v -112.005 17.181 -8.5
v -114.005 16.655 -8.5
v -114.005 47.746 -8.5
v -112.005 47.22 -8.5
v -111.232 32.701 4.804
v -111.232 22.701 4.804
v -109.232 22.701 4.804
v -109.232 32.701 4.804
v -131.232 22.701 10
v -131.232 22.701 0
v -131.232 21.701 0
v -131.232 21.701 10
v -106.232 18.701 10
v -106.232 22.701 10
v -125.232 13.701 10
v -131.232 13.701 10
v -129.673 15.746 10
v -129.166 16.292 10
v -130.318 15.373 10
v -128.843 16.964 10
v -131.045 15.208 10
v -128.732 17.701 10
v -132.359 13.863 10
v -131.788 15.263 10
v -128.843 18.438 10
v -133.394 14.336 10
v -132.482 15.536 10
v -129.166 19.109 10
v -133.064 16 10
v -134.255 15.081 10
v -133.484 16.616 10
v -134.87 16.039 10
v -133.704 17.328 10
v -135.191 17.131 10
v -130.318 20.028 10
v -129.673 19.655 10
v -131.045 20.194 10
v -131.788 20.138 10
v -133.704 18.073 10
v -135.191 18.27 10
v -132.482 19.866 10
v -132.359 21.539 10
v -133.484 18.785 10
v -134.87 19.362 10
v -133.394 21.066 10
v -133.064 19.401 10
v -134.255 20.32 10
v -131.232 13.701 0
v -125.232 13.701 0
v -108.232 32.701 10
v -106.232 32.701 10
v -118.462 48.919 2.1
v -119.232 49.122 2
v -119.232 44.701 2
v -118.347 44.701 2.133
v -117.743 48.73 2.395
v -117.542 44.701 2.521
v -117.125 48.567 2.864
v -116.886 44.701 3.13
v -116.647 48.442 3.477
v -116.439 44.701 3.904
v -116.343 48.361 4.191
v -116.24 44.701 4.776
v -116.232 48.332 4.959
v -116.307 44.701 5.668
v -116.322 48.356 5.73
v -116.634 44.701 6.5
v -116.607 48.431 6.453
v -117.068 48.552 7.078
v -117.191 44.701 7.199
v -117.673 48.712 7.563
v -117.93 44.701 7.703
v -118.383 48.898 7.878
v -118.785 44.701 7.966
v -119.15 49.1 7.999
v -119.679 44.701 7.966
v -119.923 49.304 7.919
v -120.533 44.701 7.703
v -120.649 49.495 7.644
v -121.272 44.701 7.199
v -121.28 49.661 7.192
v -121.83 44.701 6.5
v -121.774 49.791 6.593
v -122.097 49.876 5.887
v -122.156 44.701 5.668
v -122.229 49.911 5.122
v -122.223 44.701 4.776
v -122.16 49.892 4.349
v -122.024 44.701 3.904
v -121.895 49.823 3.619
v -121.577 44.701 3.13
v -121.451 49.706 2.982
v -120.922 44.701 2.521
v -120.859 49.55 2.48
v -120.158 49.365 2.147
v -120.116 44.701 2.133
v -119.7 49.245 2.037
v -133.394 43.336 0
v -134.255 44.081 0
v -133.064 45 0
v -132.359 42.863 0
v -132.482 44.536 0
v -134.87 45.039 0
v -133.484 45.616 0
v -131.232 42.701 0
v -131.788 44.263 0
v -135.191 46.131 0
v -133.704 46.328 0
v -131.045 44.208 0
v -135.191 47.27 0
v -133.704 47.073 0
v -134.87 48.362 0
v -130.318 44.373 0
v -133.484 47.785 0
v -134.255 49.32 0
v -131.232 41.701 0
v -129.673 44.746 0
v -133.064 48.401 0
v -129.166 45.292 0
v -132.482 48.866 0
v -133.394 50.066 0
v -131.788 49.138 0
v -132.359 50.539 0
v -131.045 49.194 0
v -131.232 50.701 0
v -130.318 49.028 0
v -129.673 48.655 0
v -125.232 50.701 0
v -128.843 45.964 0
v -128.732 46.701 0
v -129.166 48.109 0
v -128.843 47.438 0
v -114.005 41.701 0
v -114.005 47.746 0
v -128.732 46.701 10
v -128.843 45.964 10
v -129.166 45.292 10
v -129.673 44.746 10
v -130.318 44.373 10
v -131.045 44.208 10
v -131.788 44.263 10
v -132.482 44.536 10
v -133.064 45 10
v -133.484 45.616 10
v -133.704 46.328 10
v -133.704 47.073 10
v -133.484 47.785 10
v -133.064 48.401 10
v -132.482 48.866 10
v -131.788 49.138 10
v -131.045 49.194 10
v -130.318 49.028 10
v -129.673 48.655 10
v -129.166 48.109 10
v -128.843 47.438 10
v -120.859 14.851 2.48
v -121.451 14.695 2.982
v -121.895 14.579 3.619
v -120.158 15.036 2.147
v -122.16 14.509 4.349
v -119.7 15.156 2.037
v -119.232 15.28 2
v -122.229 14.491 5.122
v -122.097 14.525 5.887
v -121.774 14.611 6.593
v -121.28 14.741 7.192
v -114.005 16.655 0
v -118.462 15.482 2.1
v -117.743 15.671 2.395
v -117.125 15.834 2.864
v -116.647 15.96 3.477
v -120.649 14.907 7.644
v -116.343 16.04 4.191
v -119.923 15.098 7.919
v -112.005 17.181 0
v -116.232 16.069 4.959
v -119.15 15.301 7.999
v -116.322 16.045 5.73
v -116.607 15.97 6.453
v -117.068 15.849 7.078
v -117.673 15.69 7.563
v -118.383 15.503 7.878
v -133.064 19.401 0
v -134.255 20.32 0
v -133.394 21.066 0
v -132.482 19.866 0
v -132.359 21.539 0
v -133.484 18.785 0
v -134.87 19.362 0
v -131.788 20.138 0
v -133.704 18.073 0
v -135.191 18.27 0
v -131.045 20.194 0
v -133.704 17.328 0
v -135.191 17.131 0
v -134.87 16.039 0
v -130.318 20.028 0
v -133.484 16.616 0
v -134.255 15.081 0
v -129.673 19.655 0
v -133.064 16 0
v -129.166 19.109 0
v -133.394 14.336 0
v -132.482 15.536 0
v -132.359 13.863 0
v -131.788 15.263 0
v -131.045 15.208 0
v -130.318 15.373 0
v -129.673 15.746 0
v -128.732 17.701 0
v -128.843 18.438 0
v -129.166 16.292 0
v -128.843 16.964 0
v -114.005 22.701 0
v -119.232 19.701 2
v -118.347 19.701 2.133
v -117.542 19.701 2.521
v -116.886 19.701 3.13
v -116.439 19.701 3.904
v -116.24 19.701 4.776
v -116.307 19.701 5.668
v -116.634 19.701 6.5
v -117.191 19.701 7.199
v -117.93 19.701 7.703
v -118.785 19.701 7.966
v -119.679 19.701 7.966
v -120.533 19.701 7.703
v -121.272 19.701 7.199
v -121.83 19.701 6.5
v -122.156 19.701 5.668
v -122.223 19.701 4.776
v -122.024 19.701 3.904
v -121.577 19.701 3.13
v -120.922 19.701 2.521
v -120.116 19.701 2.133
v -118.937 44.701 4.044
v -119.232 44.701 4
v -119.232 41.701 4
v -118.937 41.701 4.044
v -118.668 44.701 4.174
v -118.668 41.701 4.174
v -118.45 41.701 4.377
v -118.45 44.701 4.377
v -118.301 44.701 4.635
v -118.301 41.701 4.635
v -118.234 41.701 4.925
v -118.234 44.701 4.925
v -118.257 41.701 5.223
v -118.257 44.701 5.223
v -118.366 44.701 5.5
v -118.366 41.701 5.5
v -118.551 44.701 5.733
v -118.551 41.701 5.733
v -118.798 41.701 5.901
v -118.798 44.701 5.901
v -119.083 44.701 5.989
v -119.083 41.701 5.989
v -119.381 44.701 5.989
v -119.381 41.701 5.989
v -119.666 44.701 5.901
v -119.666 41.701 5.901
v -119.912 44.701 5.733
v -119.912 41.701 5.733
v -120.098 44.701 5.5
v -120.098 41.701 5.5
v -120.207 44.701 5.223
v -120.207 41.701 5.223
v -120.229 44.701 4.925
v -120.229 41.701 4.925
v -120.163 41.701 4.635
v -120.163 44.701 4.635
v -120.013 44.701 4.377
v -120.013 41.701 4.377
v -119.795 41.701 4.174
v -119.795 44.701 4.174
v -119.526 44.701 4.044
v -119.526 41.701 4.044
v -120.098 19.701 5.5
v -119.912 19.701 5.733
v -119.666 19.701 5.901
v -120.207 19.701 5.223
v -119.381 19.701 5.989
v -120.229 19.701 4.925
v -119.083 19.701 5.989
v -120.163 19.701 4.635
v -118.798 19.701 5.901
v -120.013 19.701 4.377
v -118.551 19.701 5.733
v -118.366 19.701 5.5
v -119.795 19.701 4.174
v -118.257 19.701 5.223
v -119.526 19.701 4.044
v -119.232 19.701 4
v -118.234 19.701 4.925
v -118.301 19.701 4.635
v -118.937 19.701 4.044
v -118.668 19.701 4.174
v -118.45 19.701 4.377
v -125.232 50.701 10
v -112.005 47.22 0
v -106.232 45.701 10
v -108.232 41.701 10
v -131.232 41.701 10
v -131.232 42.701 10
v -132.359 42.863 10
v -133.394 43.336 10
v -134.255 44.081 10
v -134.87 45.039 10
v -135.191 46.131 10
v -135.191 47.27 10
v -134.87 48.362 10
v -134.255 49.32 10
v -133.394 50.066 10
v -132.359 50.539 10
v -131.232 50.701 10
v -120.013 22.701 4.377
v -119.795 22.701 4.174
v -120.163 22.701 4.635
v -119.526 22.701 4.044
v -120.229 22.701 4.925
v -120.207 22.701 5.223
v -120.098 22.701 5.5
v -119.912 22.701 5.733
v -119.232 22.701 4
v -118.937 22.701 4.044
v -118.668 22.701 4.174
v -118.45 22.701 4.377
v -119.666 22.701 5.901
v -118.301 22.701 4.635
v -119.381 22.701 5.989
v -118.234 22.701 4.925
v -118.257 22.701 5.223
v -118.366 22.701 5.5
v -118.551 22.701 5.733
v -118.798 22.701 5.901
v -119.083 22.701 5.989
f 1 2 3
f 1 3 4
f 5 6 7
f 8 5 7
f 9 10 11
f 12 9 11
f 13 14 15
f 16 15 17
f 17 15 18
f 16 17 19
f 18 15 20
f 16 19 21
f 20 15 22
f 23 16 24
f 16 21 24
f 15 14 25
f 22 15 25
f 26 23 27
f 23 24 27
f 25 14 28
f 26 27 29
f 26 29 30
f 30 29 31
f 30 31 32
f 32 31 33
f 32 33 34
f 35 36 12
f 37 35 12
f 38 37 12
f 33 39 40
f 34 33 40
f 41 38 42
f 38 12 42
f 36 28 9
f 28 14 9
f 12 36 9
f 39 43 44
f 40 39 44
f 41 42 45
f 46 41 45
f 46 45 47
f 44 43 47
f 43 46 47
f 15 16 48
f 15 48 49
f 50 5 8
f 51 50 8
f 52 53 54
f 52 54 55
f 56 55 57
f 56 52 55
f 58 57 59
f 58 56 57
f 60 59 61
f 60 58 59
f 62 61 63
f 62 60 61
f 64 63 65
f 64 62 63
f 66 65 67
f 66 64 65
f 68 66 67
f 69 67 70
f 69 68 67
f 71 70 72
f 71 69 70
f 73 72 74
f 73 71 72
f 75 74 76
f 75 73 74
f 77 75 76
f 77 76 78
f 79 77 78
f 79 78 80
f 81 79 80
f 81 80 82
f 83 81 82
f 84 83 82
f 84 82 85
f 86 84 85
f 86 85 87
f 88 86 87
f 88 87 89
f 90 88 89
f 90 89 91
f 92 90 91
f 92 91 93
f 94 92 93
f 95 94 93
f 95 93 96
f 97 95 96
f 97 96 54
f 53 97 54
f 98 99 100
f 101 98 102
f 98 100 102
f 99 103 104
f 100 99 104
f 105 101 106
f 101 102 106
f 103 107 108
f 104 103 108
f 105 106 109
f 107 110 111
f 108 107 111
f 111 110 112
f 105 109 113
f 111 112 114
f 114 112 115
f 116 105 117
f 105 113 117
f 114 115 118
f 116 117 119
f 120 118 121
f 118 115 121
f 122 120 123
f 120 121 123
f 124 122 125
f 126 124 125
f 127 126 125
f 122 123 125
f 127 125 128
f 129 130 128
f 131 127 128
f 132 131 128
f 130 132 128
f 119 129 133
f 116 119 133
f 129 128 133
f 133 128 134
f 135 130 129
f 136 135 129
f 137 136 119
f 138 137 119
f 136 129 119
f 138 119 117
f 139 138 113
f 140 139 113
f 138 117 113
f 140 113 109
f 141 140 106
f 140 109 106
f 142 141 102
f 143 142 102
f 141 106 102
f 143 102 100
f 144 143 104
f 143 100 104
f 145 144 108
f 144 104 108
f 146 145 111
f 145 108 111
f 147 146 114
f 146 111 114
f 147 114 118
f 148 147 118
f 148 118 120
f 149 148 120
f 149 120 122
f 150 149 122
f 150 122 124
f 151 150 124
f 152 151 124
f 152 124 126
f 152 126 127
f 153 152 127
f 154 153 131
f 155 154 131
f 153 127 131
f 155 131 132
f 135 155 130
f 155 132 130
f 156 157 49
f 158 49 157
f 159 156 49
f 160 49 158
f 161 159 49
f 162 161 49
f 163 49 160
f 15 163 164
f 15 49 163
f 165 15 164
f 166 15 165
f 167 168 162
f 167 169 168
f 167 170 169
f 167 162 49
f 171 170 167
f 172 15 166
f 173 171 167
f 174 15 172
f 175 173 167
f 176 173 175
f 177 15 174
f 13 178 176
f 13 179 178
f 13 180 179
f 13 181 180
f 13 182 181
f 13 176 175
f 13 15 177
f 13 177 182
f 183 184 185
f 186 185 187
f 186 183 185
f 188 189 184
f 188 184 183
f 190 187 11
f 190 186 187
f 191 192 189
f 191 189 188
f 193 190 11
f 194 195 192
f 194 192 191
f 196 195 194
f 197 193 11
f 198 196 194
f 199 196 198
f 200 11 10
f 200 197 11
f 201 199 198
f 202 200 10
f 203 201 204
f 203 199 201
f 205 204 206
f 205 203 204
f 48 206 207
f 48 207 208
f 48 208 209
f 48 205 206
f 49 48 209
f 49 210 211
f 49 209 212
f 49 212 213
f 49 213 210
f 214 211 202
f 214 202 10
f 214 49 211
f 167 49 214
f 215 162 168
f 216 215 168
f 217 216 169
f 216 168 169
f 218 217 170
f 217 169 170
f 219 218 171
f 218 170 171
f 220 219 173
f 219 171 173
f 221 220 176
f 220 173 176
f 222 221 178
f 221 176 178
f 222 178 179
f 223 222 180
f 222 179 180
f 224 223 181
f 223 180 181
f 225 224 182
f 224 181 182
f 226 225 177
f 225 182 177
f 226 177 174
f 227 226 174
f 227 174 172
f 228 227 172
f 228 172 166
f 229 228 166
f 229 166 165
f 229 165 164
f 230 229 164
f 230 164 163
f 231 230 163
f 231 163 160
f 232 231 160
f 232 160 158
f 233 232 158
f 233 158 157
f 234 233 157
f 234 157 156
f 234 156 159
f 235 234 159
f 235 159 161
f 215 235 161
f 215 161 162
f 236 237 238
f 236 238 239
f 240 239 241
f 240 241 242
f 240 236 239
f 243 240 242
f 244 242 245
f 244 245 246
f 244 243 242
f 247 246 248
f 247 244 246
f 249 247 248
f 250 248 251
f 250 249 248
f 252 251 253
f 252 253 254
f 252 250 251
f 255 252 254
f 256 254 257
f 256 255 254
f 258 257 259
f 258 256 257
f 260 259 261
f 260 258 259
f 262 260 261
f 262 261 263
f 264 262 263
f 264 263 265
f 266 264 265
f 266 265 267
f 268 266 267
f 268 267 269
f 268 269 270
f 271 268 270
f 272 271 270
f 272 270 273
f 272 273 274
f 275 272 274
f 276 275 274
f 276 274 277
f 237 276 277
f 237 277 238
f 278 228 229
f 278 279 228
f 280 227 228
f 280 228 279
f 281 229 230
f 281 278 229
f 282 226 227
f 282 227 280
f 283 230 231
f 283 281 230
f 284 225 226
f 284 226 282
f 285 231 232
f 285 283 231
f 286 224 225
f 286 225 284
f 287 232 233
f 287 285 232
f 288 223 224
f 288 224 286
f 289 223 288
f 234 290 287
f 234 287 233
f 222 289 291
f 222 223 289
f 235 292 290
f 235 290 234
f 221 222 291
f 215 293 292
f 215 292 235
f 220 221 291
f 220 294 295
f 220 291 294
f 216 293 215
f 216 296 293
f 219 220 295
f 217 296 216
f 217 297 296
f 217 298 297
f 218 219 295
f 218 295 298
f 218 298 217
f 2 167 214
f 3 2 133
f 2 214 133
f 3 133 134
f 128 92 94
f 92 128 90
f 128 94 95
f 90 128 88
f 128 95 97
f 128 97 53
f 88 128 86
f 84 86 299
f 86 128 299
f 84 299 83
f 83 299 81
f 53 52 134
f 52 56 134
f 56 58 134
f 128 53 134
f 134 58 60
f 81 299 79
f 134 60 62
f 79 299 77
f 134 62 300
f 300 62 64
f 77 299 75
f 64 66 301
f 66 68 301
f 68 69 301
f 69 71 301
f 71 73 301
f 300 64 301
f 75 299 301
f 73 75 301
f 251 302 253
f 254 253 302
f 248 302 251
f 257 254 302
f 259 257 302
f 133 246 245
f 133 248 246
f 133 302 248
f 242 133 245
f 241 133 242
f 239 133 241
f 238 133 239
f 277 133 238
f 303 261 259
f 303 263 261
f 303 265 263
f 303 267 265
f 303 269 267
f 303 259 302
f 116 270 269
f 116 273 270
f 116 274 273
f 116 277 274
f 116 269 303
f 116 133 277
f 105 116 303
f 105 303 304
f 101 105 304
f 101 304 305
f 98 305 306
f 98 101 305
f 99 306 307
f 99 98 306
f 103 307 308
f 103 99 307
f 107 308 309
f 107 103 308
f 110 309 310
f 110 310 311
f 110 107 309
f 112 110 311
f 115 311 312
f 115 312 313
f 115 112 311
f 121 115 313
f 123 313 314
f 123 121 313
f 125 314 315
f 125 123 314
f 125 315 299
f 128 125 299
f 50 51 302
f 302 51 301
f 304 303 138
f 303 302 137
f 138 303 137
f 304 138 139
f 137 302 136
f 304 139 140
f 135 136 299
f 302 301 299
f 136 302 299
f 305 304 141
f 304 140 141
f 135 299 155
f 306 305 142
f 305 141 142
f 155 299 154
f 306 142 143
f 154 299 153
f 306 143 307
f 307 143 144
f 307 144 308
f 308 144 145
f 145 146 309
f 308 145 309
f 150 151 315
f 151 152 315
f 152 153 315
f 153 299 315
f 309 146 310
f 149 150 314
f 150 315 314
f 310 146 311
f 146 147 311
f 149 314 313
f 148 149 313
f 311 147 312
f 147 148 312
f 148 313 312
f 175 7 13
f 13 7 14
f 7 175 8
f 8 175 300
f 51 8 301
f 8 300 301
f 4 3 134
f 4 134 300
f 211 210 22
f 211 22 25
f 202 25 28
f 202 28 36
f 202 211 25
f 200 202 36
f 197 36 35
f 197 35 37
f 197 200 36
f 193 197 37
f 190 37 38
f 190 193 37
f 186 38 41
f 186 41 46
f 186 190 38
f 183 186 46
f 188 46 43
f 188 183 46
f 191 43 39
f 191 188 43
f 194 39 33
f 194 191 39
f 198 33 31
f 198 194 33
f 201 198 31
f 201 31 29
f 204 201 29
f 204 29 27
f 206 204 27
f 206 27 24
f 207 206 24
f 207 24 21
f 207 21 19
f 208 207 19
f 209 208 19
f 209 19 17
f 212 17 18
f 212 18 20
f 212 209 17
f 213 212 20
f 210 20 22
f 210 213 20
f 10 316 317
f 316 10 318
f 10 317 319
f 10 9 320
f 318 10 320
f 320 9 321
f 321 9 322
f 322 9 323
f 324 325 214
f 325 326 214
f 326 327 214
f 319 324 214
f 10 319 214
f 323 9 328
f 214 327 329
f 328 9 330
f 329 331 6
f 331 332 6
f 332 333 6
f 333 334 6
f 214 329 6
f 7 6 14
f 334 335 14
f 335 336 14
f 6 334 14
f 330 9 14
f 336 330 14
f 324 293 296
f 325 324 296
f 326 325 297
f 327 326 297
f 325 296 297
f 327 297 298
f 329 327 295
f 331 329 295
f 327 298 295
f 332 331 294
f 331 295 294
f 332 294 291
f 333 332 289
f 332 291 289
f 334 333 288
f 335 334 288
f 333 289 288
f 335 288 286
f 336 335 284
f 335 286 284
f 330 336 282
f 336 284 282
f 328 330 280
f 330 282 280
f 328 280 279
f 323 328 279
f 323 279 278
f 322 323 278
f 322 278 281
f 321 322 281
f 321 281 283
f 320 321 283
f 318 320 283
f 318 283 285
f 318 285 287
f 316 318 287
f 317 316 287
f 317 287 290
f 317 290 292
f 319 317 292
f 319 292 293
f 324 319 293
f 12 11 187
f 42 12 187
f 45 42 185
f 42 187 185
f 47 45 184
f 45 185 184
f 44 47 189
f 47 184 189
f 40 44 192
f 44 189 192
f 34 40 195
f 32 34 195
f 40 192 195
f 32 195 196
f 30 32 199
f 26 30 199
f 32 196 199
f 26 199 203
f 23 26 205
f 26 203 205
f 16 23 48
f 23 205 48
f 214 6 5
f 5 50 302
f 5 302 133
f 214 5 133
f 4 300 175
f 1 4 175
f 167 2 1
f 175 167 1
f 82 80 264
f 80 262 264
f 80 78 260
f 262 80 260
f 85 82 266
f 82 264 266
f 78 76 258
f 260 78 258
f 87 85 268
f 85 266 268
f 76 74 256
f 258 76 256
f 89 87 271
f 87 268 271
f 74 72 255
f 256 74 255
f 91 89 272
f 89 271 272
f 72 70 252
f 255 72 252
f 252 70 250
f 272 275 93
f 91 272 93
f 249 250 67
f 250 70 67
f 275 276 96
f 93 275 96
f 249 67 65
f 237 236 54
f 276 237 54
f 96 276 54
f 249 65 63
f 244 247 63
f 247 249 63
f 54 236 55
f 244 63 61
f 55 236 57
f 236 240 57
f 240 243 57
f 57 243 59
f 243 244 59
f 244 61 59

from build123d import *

# Parameters (mm, degrees)
CROQUIS1_R              = 2.5
SALIENTE_EXTRUIR1_DEPTH = 10
CROQUIS2_R              = 1
CORTAR_EXTRUIR1_DEPTH   = 4
SALIENTE_EXTRUIR2_DEPTH = 13.5
CROQUIS4_R              = 3
CORTAR_EXTRUIR2_DEPTH   = 1
SALIENTE_EXTRUIR3_START = 5
CROQUIS6_R              = 3
SALIENTE_EXTRUIR3_DEPTH = 5
CORTAR_EXTRUIR3_DEPTH   = 10
SALIENTE_EXTRUIR4_DEPTH = 8.5
CROQUIS5_W              = 2
CROQUIS5_H              = 10
CORTAR_EXTRUIR4_DEPTH   = 6


with BuildPart() as part:
    # Croquis1 → Saliente-Extruir1 (new body)
    with BuildSketch(Plane.XY):
        with BuildLine():
            Line((-106.231635218, 22.700651543), (-131.231635218, 22.700651543))
            Line((-131.231635218, 22.700651543), (-131.231635218, 21.700651543))
            ThreePointArc((-131.231635218, 21.700651543), (-135.231635218, 17.700651543), (-131.231635218, 13.700651543))
            Line((-131.231635218, 13.700651543), (-125.231635218, 13.700651543))
            Line((-125.231635218, 13.700651543), (-125.231635218, 18.700651543))
            Line((-125.231635218, 18.700651543), (-106.231635218, 18.700651543))
            Line((-106.231635218, 18.700651543), (-106.231635218, 22.700651543))
        make_face()
        with Locations((-131.231635218, 17.700651543)):
            Circle(CROQUIS1_R, mode=Mode.SUBTRACT)
    extrude(amount=SALIENTE_EXTRUIR1_DEPTH)

    # Croquis2 → Cortar-Extruir1 (cut)
    with BuildSketch(Plane.XZ.offset(-18.700651543)):
        with Locations(Location((-119.231635218, 5, 0), (0, 0, 270))):
            Circle(CROQUIS2_R)
        Polygon((-106.231635218, 0), (-106.231635218, 10), (-112.00513791, 0), align=None)
    extrude(amount=-CORTAR_EXTRUIR1_DEPTH, mode=Mode.SUBTRACT)

    # Croquis3 → Saliente-Extruir2 (add)
    with BuildSketch(Plane.XZ.offset(-18.700651543)):
        Polygon((-106.231635218, 10), (-108.231635218, 10), (-114.00513791, 0), (-112.00513791, 0), align=None)
    extrude(amount=-SALIENTE_EXTRUIR2_DEPTH)

    # Croquis4 → Cortar-Extruir2 (cut)
    with BuildSketch(Plane.XZ.offset(-18.700651543)):
        with Locations(Location((-119.231635218, 5, 0), (0, 0, 270))):
            Circle(CROQUIS4_R)
    extrude(amount=-CORTAR_EXTRUIR2_DEPTH, mode=Mode.SUBTRACT)

    # Croquis6 → Saliente-Extruir3 (add)
    with BuildSketch(Plane.XZ.offset(-18.700651543).offset(SALIENTE_EXTRUIR3_START)):
        Polygon((-106.231635218, 10), (-125.231635218, 10), (-125.231635218, 0), (-112.00513791, 0), align=None)
        with Locations(Location((-119.231635218, 5, 0), (0, 0, 270))):
            Circle(CROQUIS6_R, mode=Mode.SUBTRACT)
    extrude(amount=-SALIENTE_EXTRUIR3_DEPTH)

    # Croquis7 → Cortar-Extruir3 (cut)
    with BuildSketch(Plane.XY.offset(10)):
        Polygon((-106.231635218, 18.700651543), (-106.231635218, 13.700651543), (-125.231635218, 13.700651543), align=None)
    extrude(amount=-CORTAR_EXTRUIR3_DEPTH, mode=Mode.SUBTRACT)

    # Croquis8 → Saliente-Extruir4 (add)
    with BuildSketch(Plane(origin=(0, 0, 0), x_dir=(-1, 0, 0), z_dir=(0, 0, -1))):
        Polygon((112.00513791, 17.181308729), (112.00513791, 32.200651543), (114.00513791, 32.200651543), (114.00513791, 16.65499294), align=None)
    extrude(amount=SALIENTE_EXTRUIR4_DEPTH)

    # Simetría1: part across plane


with BuildPart() as part_1:
    add(part.part)
    add(part.part.mirror(Plane(origin=(0, 32.200651543, 0), x_dir=(0, 0, 1), z_dir=(0, -1, 0))))

    # Croquis5 → Cortar-Extruir4 (cut, along a direction that is not the sketch's normal)
    with BuildSketch(Plane.XY.offset(10)):
        with Locations((-107.231635218, 27.700651543)):
            Rectangle(CROQUIS5_W, CROQUIS5_H)
    extrude(amount=-CORTAR_EXTRUIR4_DEPTH, dir=(0.49999999999999506, 0, 0.8660254037844416), mode=Mode.SUBTRACT)


solid = part_1.part
